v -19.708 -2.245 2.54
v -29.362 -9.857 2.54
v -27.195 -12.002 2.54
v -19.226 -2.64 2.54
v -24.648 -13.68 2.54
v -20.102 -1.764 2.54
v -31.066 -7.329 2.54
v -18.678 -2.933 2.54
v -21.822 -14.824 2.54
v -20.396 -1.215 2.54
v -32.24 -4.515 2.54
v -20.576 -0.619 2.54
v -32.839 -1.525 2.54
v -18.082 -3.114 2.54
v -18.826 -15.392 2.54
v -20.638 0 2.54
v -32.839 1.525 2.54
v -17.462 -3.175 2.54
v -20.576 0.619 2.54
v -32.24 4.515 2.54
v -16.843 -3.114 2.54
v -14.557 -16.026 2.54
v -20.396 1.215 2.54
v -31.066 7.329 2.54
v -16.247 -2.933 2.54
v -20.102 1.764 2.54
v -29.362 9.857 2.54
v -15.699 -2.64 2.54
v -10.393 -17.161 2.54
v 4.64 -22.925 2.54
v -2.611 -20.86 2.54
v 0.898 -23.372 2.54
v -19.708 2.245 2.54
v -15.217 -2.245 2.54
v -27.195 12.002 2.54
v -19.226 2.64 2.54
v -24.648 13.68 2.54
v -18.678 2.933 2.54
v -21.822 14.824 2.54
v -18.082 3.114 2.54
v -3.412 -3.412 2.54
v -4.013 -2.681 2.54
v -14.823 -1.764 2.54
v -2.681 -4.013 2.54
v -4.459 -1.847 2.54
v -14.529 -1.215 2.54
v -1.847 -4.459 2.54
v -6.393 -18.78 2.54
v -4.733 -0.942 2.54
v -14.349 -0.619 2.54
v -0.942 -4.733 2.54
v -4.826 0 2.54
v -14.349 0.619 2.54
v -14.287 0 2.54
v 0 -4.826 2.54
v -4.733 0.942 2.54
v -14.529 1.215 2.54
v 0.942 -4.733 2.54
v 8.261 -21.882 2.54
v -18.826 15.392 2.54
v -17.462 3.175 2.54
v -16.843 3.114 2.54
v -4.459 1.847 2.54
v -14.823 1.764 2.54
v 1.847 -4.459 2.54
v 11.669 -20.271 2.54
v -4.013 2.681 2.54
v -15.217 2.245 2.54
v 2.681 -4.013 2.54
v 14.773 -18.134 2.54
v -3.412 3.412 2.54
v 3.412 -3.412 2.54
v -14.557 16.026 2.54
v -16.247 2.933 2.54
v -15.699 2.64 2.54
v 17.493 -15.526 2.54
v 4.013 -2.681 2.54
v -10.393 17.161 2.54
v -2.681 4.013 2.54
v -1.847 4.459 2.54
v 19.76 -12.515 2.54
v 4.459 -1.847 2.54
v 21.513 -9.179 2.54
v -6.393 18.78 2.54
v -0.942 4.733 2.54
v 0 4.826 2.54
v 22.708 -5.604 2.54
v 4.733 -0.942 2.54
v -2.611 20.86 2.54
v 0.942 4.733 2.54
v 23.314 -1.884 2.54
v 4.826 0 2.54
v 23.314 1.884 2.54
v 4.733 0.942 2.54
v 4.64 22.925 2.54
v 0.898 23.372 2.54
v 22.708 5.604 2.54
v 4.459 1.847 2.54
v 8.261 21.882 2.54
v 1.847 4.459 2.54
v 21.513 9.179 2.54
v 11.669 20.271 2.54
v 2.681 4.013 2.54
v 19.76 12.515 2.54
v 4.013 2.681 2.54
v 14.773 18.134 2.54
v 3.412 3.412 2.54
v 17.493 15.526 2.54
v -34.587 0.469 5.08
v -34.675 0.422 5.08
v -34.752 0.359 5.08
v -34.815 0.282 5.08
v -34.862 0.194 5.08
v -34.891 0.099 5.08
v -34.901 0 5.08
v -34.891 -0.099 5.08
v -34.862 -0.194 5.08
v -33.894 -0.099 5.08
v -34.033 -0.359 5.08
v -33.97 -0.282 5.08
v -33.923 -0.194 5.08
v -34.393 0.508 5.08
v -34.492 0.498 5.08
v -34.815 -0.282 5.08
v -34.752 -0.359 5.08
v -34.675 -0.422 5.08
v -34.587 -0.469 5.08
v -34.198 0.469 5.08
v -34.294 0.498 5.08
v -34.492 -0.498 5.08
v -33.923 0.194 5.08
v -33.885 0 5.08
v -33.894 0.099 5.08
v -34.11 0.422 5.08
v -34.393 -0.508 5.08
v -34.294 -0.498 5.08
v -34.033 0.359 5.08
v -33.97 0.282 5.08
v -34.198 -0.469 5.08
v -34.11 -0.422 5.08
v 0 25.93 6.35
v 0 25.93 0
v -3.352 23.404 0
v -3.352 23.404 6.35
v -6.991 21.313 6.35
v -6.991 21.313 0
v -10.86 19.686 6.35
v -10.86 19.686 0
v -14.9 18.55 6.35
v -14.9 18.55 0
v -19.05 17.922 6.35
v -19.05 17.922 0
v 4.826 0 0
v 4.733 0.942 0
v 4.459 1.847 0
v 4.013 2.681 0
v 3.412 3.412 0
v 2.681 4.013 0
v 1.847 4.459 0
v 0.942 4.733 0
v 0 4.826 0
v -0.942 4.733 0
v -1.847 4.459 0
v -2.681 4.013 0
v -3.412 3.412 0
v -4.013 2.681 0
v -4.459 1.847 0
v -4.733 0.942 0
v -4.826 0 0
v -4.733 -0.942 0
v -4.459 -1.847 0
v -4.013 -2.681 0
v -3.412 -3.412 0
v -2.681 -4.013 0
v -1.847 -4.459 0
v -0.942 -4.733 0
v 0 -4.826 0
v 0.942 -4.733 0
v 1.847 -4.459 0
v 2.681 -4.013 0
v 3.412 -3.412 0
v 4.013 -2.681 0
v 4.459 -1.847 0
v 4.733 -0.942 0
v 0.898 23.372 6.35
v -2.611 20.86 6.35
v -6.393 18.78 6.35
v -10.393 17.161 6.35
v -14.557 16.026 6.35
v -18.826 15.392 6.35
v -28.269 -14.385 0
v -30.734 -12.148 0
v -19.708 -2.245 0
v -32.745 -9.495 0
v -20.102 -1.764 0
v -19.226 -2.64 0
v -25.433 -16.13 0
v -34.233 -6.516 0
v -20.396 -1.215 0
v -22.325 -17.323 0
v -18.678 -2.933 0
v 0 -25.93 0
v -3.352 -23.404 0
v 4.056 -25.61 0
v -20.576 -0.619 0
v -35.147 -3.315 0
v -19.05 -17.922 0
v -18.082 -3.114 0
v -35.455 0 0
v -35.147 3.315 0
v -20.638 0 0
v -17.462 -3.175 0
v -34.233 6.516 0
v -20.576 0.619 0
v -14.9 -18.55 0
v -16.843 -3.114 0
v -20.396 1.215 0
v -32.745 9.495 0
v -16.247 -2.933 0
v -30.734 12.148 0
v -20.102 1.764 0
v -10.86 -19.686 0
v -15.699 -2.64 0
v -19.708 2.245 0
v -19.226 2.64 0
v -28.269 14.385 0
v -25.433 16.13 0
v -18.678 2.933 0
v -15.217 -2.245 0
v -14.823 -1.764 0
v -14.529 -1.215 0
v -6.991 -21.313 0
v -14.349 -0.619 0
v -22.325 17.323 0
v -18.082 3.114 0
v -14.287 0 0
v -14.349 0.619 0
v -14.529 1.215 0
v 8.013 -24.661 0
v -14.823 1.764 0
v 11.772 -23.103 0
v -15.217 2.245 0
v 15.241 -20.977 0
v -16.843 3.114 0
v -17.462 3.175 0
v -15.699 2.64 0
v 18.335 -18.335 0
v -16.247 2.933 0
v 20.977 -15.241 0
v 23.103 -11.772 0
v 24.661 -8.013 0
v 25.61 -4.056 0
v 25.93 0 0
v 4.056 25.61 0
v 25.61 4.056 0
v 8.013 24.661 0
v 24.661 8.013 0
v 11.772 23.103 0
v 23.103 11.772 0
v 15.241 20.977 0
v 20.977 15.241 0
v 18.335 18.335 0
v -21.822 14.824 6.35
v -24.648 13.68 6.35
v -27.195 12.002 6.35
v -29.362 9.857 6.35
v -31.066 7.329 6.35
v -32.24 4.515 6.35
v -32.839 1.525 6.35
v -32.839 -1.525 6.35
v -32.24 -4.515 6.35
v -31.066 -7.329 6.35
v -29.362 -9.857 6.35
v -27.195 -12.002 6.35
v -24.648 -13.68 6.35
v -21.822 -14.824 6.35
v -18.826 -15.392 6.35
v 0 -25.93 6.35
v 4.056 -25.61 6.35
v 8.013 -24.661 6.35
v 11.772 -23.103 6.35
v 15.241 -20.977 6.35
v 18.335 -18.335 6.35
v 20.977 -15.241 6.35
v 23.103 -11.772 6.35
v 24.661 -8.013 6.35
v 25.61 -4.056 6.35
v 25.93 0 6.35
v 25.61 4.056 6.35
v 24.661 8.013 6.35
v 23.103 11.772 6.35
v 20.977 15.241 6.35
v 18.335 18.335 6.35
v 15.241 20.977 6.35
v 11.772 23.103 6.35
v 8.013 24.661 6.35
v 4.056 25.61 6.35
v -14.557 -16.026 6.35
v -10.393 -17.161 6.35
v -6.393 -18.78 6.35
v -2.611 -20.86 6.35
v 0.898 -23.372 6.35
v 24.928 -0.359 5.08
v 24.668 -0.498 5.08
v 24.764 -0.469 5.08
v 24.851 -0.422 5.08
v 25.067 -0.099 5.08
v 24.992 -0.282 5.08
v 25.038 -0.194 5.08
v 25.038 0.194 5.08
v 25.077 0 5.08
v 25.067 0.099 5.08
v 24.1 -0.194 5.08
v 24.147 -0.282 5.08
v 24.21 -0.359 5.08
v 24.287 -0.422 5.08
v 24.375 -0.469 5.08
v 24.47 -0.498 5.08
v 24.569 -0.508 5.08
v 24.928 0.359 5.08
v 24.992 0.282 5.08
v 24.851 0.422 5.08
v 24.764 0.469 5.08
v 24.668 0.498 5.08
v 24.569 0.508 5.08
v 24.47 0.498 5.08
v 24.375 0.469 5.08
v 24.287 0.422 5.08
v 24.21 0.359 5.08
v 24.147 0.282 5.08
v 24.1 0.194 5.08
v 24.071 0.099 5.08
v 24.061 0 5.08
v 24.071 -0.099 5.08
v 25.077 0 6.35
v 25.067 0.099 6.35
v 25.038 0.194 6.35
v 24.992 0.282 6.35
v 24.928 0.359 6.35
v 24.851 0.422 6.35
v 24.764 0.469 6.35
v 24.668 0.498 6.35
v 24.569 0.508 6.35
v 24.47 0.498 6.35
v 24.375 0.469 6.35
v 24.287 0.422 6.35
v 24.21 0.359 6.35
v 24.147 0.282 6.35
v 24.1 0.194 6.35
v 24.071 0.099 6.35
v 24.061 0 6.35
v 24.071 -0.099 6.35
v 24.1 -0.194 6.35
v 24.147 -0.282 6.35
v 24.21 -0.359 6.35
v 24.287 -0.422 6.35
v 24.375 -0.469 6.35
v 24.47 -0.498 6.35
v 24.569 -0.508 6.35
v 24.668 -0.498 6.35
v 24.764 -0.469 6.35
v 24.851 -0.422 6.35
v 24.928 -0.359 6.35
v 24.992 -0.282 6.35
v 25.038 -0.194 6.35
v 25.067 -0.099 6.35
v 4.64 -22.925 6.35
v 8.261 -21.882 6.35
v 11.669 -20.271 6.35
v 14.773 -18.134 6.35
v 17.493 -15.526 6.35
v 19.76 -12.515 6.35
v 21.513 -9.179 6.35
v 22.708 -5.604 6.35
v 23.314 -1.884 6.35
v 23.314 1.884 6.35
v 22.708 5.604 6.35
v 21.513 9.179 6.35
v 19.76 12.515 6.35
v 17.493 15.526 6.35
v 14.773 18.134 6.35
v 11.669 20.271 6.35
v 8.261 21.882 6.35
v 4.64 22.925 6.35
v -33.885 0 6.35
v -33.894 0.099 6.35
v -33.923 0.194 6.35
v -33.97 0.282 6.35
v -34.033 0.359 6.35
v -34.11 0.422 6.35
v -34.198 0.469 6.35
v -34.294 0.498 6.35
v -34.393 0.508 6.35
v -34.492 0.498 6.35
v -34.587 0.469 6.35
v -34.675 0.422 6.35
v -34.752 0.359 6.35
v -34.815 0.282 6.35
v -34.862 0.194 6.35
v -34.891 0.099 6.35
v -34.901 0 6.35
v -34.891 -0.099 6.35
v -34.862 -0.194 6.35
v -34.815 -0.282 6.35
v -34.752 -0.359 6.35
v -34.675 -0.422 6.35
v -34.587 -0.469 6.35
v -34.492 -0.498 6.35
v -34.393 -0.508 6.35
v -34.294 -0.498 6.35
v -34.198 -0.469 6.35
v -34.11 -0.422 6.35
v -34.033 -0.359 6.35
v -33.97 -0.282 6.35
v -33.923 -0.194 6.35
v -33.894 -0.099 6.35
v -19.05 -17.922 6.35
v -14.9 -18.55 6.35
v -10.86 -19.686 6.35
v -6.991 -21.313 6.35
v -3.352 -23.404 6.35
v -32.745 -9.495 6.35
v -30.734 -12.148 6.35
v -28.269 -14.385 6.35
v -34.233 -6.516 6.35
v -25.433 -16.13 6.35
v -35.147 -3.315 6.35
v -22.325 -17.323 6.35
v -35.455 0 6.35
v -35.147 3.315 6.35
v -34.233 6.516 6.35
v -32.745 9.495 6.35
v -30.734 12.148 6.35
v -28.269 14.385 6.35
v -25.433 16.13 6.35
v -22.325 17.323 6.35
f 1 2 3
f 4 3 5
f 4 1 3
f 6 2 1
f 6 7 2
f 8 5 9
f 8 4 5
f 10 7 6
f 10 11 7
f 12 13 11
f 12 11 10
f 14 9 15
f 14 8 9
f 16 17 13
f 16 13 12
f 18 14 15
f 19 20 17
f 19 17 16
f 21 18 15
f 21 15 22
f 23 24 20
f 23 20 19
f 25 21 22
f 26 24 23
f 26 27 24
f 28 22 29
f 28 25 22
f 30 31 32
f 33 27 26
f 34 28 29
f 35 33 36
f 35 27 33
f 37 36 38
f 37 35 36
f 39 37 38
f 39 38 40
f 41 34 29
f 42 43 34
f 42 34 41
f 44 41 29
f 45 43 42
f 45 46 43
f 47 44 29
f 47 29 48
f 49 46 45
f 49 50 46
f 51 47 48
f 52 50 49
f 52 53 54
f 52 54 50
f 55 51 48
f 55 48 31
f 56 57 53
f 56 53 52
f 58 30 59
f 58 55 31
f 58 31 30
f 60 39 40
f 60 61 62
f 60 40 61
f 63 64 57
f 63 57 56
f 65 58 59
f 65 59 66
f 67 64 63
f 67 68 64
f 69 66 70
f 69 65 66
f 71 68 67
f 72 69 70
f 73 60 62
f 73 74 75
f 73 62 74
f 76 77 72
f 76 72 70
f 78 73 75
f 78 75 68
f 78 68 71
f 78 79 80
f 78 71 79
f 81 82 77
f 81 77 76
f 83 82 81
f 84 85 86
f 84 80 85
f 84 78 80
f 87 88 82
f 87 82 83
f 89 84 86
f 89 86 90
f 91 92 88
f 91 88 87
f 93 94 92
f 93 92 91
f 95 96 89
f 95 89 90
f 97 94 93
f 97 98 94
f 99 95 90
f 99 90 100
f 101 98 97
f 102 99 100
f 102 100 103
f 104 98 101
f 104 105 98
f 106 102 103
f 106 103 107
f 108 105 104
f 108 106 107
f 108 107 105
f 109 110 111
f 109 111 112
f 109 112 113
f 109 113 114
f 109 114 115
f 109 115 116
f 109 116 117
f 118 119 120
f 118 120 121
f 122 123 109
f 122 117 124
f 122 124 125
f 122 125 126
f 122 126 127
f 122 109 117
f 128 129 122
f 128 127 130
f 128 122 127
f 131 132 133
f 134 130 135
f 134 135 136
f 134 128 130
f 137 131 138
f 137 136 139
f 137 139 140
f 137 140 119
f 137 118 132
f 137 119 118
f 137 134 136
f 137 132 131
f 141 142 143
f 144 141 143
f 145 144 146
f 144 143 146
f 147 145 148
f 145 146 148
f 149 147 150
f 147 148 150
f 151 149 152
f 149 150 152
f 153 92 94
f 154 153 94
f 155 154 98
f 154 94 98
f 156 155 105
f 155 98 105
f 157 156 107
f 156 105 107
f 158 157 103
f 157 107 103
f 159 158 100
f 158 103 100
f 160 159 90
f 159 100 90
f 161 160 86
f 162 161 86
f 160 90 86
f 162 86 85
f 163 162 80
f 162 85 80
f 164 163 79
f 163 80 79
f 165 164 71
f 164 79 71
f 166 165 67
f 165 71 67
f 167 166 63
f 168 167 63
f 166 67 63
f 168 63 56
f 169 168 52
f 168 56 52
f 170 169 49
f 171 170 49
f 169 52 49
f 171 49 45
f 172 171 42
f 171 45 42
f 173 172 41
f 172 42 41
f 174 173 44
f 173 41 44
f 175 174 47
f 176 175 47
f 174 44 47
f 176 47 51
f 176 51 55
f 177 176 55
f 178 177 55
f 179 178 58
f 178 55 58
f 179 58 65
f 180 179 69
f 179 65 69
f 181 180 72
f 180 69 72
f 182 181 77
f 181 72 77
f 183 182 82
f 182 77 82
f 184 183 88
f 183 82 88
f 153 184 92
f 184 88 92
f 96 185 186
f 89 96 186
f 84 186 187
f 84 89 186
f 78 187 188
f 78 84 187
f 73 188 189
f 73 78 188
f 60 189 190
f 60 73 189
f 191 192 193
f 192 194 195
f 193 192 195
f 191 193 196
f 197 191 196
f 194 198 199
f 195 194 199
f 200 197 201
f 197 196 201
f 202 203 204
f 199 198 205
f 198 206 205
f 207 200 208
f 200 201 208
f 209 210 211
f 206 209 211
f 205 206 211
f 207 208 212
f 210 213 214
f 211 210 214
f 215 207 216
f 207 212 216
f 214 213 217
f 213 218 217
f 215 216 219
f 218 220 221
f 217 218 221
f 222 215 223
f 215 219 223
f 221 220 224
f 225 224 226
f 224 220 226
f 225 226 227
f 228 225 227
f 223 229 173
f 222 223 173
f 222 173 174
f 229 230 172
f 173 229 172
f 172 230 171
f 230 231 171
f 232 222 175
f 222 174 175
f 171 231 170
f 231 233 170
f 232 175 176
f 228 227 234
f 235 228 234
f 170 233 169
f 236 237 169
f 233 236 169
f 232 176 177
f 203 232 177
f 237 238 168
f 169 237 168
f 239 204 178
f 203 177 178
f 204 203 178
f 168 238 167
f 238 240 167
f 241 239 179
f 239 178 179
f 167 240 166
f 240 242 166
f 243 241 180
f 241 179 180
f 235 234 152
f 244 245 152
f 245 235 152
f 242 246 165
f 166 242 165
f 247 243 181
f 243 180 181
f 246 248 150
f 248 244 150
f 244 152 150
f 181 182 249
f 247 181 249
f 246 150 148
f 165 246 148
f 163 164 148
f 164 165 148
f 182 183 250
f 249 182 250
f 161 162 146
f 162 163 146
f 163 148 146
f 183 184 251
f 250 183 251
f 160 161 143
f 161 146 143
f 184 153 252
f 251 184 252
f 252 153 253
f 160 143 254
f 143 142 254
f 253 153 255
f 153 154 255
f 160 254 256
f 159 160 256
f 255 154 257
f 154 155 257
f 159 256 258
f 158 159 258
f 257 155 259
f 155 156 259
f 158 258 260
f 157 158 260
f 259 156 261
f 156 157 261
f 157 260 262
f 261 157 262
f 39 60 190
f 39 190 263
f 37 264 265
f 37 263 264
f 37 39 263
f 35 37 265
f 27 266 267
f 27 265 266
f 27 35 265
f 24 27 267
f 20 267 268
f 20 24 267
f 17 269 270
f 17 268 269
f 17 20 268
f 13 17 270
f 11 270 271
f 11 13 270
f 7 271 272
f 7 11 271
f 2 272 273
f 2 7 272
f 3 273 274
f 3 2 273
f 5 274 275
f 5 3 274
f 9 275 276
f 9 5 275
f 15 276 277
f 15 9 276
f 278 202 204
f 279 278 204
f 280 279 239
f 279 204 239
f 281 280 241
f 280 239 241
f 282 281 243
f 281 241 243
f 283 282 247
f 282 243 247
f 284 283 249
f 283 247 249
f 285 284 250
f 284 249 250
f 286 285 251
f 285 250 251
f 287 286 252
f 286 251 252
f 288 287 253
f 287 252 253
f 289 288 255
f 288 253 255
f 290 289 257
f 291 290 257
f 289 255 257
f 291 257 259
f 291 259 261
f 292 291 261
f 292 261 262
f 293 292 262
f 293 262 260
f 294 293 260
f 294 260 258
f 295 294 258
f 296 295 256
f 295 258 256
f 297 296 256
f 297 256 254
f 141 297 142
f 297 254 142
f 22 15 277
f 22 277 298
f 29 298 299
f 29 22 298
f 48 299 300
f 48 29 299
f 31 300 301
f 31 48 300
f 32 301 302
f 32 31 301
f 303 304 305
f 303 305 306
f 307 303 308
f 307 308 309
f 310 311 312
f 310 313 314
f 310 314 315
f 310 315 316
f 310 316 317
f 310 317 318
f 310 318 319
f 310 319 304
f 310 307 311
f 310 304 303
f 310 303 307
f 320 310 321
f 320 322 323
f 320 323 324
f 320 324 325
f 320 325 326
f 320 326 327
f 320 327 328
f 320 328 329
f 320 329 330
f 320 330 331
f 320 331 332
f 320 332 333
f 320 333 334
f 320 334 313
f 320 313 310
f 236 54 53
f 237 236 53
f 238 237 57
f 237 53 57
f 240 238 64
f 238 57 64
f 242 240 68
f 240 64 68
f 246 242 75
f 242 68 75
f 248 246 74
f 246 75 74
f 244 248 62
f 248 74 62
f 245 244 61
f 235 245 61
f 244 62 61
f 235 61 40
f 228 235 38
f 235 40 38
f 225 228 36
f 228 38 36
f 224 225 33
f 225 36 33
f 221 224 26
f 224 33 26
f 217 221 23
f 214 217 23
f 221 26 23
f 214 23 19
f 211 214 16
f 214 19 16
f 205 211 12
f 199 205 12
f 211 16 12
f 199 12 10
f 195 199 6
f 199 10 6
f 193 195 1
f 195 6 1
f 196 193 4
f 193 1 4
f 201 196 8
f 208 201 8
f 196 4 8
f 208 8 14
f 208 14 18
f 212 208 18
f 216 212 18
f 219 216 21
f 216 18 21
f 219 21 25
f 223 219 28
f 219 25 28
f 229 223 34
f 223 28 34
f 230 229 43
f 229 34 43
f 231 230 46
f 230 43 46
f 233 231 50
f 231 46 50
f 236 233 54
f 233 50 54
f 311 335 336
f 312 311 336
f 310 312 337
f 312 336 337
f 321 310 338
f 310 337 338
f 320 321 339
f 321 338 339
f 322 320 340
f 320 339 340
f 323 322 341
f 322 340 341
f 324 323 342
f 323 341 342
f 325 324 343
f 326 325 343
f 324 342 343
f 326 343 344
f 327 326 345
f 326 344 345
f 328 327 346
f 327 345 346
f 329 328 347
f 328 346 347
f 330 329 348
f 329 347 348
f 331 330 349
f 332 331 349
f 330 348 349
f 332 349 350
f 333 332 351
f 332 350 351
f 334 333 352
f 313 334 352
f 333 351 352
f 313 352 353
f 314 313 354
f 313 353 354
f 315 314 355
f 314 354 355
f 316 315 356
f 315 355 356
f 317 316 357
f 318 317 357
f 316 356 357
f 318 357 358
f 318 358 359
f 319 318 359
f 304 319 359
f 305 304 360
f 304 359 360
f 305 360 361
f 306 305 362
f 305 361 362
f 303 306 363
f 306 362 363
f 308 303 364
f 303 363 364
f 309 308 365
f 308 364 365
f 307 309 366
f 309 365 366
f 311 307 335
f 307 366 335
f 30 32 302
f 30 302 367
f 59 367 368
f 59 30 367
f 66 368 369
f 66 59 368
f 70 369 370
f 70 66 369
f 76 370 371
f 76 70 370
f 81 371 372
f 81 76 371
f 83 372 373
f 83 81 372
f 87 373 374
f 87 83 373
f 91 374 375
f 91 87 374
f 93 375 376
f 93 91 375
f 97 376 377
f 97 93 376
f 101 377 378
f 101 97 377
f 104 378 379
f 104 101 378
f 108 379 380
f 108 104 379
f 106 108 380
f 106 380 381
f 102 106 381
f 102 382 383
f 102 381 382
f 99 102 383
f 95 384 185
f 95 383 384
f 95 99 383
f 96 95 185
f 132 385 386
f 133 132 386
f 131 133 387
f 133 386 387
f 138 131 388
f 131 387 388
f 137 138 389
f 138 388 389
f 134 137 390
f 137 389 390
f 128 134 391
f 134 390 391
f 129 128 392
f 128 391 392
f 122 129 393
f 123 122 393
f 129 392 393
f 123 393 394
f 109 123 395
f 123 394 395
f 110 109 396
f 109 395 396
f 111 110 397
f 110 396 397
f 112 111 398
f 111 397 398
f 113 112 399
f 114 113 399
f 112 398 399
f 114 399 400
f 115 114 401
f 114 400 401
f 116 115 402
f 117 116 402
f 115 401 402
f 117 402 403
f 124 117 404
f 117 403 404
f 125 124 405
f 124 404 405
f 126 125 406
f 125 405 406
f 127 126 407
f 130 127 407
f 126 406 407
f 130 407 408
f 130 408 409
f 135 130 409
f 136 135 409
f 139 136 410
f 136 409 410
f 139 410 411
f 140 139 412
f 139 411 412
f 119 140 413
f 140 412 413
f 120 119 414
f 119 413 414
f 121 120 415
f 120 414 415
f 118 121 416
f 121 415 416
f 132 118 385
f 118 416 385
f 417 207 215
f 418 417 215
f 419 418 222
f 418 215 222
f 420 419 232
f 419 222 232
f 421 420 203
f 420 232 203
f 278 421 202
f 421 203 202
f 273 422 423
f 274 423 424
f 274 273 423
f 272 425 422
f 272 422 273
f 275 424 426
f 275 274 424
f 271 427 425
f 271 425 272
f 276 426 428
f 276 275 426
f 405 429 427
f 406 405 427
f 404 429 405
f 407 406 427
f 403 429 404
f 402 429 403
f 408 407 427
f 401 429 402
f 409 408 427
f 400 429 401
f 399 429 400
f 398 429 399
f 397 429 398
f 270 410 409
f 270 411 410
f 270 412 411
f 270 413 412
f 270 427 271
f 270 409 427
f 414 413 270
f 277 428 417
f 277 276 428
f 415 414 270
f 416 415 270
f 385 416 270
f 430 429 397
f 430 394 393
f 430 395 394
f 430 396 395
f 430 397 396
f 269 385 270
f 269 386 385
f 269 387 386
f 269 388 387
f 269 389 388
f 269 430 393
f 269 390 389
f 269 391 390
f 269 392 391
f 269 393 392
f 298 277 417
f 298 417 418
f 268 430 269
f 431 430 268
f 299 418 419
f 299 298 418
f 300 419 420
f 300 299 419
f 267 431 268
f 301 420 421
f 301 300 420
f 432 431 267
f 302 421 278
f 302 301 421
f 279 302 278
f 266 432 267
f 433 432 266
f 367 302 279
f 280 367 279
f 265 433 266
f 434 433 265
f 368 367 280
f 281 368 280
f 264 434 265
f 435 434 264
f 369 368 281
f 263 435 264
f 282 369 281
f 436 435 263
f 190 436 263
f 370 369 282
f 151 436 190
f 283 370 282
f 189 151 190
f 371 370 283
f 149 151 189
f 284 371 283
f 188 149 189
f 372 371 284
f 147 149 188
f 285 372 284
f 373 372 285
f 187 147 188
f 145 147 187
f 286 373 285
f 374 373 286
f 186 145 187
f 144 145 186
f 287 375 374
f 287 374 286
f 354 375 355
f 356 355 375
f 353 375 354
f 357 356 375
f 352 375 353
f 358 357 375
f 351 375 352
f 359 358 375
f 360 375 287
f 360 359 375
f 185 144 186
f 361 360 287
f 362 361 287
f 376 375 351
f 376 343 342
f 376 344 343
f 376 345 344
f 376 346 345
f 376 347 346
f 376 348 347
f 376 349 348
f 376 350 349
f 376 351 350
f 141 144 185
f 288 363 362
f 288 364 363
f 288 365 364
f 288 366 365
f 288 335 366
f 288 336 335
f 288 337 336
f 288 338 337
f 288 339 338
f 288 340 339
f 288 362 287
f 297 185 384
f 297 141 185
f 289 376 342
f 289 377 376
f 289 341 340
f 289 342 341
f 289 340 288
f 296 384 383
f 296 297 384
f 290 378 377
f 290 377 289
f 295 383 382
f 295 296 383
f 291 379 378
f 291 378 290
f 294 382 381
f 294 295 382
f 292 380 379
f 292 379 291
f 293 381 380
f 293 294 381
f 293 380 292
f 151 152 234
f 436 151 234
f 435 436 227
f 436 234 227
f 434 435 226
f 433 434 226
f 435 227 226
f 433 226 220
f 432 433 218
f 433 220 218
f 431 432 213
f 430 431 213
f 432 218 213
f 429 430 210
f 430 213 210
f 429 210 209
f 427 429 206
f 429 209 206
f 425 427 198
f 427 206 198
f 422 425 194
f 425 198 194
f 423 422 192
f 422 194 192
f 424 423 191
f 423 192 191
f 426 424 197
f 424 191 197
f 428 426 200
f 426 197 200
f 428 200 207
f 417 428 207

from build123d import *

# Parameters (mm, degrees)
BOSS_EXTRUDE1_DEPTH = 6.35
SHELL1_T            = -2.54
SKETCH3_R           = 4.826
SKETCH3_R_2         = 3.175
CUT_EXTRUDE1_DEPTH  = 2.54
SKETCH2_R           = 0.508
CUT_EXTRUDE2_DEPTH  = 1.27


with BuildPart() as part:
    # Sketch1 → Boss-Extrude1 (new body)
    with BuildSketch(Plane.XY):
        with BuildLine():
            ThreePointArc((0, -25.92959), (25.92959, 0), (0, 25.92959))
            ThreePointArc((0, 25.92959), (-8.900253562, 20.439501874), (-19.05, 17.921918042))
            ThreePointArc((-19.05, 17.921918042), (-35.45459, 0), (-19.05, -17.921918042))
            ThreePointArc((-19.05, -17.921918042), (-8.900253562, -20.439501874), (0, -25.92959))
        make_face()
    extrude(amount=BOSS_EXTRUDE1_DEPTH)

    # Shell1
    shell1_openings = [part.faces().sort_by_distance(p)[0] for p in [
        (-3.11409352, 0, 6.35),
    ]]
    offset(amount=SHELL1_T, openings=shell1_openings, kind=Kind.INTERSECTION)

    # Sketch3 → Cut-Extrude1 (cut)
    with BuildSketch(Plane.XY.offset(2.54)):
        Circle(SKETCH3_R)
        with Locations((-17.4625, 0)):
            Circle(SKETCH3_R_2)
    extrude(amount=-CUT_EXTRUDE1_DEPTH, mode=Mode.SUBTRACT)

    # Sketch2 → Cut-Extrude2 (cut)
    with BuildSketch(Plane.XY.offset(6.35)):
        with Locations((-34.39268404, 0)):
            Circle(SKETCH2_R)
        with Locations((24.569143143, 0)):
            Circle(SKETCH2_R)
    extrude(amount=-CUT_EXTRUDE2_DEPTH, mode=Mode.SUBTRACT)


solid = part.part
